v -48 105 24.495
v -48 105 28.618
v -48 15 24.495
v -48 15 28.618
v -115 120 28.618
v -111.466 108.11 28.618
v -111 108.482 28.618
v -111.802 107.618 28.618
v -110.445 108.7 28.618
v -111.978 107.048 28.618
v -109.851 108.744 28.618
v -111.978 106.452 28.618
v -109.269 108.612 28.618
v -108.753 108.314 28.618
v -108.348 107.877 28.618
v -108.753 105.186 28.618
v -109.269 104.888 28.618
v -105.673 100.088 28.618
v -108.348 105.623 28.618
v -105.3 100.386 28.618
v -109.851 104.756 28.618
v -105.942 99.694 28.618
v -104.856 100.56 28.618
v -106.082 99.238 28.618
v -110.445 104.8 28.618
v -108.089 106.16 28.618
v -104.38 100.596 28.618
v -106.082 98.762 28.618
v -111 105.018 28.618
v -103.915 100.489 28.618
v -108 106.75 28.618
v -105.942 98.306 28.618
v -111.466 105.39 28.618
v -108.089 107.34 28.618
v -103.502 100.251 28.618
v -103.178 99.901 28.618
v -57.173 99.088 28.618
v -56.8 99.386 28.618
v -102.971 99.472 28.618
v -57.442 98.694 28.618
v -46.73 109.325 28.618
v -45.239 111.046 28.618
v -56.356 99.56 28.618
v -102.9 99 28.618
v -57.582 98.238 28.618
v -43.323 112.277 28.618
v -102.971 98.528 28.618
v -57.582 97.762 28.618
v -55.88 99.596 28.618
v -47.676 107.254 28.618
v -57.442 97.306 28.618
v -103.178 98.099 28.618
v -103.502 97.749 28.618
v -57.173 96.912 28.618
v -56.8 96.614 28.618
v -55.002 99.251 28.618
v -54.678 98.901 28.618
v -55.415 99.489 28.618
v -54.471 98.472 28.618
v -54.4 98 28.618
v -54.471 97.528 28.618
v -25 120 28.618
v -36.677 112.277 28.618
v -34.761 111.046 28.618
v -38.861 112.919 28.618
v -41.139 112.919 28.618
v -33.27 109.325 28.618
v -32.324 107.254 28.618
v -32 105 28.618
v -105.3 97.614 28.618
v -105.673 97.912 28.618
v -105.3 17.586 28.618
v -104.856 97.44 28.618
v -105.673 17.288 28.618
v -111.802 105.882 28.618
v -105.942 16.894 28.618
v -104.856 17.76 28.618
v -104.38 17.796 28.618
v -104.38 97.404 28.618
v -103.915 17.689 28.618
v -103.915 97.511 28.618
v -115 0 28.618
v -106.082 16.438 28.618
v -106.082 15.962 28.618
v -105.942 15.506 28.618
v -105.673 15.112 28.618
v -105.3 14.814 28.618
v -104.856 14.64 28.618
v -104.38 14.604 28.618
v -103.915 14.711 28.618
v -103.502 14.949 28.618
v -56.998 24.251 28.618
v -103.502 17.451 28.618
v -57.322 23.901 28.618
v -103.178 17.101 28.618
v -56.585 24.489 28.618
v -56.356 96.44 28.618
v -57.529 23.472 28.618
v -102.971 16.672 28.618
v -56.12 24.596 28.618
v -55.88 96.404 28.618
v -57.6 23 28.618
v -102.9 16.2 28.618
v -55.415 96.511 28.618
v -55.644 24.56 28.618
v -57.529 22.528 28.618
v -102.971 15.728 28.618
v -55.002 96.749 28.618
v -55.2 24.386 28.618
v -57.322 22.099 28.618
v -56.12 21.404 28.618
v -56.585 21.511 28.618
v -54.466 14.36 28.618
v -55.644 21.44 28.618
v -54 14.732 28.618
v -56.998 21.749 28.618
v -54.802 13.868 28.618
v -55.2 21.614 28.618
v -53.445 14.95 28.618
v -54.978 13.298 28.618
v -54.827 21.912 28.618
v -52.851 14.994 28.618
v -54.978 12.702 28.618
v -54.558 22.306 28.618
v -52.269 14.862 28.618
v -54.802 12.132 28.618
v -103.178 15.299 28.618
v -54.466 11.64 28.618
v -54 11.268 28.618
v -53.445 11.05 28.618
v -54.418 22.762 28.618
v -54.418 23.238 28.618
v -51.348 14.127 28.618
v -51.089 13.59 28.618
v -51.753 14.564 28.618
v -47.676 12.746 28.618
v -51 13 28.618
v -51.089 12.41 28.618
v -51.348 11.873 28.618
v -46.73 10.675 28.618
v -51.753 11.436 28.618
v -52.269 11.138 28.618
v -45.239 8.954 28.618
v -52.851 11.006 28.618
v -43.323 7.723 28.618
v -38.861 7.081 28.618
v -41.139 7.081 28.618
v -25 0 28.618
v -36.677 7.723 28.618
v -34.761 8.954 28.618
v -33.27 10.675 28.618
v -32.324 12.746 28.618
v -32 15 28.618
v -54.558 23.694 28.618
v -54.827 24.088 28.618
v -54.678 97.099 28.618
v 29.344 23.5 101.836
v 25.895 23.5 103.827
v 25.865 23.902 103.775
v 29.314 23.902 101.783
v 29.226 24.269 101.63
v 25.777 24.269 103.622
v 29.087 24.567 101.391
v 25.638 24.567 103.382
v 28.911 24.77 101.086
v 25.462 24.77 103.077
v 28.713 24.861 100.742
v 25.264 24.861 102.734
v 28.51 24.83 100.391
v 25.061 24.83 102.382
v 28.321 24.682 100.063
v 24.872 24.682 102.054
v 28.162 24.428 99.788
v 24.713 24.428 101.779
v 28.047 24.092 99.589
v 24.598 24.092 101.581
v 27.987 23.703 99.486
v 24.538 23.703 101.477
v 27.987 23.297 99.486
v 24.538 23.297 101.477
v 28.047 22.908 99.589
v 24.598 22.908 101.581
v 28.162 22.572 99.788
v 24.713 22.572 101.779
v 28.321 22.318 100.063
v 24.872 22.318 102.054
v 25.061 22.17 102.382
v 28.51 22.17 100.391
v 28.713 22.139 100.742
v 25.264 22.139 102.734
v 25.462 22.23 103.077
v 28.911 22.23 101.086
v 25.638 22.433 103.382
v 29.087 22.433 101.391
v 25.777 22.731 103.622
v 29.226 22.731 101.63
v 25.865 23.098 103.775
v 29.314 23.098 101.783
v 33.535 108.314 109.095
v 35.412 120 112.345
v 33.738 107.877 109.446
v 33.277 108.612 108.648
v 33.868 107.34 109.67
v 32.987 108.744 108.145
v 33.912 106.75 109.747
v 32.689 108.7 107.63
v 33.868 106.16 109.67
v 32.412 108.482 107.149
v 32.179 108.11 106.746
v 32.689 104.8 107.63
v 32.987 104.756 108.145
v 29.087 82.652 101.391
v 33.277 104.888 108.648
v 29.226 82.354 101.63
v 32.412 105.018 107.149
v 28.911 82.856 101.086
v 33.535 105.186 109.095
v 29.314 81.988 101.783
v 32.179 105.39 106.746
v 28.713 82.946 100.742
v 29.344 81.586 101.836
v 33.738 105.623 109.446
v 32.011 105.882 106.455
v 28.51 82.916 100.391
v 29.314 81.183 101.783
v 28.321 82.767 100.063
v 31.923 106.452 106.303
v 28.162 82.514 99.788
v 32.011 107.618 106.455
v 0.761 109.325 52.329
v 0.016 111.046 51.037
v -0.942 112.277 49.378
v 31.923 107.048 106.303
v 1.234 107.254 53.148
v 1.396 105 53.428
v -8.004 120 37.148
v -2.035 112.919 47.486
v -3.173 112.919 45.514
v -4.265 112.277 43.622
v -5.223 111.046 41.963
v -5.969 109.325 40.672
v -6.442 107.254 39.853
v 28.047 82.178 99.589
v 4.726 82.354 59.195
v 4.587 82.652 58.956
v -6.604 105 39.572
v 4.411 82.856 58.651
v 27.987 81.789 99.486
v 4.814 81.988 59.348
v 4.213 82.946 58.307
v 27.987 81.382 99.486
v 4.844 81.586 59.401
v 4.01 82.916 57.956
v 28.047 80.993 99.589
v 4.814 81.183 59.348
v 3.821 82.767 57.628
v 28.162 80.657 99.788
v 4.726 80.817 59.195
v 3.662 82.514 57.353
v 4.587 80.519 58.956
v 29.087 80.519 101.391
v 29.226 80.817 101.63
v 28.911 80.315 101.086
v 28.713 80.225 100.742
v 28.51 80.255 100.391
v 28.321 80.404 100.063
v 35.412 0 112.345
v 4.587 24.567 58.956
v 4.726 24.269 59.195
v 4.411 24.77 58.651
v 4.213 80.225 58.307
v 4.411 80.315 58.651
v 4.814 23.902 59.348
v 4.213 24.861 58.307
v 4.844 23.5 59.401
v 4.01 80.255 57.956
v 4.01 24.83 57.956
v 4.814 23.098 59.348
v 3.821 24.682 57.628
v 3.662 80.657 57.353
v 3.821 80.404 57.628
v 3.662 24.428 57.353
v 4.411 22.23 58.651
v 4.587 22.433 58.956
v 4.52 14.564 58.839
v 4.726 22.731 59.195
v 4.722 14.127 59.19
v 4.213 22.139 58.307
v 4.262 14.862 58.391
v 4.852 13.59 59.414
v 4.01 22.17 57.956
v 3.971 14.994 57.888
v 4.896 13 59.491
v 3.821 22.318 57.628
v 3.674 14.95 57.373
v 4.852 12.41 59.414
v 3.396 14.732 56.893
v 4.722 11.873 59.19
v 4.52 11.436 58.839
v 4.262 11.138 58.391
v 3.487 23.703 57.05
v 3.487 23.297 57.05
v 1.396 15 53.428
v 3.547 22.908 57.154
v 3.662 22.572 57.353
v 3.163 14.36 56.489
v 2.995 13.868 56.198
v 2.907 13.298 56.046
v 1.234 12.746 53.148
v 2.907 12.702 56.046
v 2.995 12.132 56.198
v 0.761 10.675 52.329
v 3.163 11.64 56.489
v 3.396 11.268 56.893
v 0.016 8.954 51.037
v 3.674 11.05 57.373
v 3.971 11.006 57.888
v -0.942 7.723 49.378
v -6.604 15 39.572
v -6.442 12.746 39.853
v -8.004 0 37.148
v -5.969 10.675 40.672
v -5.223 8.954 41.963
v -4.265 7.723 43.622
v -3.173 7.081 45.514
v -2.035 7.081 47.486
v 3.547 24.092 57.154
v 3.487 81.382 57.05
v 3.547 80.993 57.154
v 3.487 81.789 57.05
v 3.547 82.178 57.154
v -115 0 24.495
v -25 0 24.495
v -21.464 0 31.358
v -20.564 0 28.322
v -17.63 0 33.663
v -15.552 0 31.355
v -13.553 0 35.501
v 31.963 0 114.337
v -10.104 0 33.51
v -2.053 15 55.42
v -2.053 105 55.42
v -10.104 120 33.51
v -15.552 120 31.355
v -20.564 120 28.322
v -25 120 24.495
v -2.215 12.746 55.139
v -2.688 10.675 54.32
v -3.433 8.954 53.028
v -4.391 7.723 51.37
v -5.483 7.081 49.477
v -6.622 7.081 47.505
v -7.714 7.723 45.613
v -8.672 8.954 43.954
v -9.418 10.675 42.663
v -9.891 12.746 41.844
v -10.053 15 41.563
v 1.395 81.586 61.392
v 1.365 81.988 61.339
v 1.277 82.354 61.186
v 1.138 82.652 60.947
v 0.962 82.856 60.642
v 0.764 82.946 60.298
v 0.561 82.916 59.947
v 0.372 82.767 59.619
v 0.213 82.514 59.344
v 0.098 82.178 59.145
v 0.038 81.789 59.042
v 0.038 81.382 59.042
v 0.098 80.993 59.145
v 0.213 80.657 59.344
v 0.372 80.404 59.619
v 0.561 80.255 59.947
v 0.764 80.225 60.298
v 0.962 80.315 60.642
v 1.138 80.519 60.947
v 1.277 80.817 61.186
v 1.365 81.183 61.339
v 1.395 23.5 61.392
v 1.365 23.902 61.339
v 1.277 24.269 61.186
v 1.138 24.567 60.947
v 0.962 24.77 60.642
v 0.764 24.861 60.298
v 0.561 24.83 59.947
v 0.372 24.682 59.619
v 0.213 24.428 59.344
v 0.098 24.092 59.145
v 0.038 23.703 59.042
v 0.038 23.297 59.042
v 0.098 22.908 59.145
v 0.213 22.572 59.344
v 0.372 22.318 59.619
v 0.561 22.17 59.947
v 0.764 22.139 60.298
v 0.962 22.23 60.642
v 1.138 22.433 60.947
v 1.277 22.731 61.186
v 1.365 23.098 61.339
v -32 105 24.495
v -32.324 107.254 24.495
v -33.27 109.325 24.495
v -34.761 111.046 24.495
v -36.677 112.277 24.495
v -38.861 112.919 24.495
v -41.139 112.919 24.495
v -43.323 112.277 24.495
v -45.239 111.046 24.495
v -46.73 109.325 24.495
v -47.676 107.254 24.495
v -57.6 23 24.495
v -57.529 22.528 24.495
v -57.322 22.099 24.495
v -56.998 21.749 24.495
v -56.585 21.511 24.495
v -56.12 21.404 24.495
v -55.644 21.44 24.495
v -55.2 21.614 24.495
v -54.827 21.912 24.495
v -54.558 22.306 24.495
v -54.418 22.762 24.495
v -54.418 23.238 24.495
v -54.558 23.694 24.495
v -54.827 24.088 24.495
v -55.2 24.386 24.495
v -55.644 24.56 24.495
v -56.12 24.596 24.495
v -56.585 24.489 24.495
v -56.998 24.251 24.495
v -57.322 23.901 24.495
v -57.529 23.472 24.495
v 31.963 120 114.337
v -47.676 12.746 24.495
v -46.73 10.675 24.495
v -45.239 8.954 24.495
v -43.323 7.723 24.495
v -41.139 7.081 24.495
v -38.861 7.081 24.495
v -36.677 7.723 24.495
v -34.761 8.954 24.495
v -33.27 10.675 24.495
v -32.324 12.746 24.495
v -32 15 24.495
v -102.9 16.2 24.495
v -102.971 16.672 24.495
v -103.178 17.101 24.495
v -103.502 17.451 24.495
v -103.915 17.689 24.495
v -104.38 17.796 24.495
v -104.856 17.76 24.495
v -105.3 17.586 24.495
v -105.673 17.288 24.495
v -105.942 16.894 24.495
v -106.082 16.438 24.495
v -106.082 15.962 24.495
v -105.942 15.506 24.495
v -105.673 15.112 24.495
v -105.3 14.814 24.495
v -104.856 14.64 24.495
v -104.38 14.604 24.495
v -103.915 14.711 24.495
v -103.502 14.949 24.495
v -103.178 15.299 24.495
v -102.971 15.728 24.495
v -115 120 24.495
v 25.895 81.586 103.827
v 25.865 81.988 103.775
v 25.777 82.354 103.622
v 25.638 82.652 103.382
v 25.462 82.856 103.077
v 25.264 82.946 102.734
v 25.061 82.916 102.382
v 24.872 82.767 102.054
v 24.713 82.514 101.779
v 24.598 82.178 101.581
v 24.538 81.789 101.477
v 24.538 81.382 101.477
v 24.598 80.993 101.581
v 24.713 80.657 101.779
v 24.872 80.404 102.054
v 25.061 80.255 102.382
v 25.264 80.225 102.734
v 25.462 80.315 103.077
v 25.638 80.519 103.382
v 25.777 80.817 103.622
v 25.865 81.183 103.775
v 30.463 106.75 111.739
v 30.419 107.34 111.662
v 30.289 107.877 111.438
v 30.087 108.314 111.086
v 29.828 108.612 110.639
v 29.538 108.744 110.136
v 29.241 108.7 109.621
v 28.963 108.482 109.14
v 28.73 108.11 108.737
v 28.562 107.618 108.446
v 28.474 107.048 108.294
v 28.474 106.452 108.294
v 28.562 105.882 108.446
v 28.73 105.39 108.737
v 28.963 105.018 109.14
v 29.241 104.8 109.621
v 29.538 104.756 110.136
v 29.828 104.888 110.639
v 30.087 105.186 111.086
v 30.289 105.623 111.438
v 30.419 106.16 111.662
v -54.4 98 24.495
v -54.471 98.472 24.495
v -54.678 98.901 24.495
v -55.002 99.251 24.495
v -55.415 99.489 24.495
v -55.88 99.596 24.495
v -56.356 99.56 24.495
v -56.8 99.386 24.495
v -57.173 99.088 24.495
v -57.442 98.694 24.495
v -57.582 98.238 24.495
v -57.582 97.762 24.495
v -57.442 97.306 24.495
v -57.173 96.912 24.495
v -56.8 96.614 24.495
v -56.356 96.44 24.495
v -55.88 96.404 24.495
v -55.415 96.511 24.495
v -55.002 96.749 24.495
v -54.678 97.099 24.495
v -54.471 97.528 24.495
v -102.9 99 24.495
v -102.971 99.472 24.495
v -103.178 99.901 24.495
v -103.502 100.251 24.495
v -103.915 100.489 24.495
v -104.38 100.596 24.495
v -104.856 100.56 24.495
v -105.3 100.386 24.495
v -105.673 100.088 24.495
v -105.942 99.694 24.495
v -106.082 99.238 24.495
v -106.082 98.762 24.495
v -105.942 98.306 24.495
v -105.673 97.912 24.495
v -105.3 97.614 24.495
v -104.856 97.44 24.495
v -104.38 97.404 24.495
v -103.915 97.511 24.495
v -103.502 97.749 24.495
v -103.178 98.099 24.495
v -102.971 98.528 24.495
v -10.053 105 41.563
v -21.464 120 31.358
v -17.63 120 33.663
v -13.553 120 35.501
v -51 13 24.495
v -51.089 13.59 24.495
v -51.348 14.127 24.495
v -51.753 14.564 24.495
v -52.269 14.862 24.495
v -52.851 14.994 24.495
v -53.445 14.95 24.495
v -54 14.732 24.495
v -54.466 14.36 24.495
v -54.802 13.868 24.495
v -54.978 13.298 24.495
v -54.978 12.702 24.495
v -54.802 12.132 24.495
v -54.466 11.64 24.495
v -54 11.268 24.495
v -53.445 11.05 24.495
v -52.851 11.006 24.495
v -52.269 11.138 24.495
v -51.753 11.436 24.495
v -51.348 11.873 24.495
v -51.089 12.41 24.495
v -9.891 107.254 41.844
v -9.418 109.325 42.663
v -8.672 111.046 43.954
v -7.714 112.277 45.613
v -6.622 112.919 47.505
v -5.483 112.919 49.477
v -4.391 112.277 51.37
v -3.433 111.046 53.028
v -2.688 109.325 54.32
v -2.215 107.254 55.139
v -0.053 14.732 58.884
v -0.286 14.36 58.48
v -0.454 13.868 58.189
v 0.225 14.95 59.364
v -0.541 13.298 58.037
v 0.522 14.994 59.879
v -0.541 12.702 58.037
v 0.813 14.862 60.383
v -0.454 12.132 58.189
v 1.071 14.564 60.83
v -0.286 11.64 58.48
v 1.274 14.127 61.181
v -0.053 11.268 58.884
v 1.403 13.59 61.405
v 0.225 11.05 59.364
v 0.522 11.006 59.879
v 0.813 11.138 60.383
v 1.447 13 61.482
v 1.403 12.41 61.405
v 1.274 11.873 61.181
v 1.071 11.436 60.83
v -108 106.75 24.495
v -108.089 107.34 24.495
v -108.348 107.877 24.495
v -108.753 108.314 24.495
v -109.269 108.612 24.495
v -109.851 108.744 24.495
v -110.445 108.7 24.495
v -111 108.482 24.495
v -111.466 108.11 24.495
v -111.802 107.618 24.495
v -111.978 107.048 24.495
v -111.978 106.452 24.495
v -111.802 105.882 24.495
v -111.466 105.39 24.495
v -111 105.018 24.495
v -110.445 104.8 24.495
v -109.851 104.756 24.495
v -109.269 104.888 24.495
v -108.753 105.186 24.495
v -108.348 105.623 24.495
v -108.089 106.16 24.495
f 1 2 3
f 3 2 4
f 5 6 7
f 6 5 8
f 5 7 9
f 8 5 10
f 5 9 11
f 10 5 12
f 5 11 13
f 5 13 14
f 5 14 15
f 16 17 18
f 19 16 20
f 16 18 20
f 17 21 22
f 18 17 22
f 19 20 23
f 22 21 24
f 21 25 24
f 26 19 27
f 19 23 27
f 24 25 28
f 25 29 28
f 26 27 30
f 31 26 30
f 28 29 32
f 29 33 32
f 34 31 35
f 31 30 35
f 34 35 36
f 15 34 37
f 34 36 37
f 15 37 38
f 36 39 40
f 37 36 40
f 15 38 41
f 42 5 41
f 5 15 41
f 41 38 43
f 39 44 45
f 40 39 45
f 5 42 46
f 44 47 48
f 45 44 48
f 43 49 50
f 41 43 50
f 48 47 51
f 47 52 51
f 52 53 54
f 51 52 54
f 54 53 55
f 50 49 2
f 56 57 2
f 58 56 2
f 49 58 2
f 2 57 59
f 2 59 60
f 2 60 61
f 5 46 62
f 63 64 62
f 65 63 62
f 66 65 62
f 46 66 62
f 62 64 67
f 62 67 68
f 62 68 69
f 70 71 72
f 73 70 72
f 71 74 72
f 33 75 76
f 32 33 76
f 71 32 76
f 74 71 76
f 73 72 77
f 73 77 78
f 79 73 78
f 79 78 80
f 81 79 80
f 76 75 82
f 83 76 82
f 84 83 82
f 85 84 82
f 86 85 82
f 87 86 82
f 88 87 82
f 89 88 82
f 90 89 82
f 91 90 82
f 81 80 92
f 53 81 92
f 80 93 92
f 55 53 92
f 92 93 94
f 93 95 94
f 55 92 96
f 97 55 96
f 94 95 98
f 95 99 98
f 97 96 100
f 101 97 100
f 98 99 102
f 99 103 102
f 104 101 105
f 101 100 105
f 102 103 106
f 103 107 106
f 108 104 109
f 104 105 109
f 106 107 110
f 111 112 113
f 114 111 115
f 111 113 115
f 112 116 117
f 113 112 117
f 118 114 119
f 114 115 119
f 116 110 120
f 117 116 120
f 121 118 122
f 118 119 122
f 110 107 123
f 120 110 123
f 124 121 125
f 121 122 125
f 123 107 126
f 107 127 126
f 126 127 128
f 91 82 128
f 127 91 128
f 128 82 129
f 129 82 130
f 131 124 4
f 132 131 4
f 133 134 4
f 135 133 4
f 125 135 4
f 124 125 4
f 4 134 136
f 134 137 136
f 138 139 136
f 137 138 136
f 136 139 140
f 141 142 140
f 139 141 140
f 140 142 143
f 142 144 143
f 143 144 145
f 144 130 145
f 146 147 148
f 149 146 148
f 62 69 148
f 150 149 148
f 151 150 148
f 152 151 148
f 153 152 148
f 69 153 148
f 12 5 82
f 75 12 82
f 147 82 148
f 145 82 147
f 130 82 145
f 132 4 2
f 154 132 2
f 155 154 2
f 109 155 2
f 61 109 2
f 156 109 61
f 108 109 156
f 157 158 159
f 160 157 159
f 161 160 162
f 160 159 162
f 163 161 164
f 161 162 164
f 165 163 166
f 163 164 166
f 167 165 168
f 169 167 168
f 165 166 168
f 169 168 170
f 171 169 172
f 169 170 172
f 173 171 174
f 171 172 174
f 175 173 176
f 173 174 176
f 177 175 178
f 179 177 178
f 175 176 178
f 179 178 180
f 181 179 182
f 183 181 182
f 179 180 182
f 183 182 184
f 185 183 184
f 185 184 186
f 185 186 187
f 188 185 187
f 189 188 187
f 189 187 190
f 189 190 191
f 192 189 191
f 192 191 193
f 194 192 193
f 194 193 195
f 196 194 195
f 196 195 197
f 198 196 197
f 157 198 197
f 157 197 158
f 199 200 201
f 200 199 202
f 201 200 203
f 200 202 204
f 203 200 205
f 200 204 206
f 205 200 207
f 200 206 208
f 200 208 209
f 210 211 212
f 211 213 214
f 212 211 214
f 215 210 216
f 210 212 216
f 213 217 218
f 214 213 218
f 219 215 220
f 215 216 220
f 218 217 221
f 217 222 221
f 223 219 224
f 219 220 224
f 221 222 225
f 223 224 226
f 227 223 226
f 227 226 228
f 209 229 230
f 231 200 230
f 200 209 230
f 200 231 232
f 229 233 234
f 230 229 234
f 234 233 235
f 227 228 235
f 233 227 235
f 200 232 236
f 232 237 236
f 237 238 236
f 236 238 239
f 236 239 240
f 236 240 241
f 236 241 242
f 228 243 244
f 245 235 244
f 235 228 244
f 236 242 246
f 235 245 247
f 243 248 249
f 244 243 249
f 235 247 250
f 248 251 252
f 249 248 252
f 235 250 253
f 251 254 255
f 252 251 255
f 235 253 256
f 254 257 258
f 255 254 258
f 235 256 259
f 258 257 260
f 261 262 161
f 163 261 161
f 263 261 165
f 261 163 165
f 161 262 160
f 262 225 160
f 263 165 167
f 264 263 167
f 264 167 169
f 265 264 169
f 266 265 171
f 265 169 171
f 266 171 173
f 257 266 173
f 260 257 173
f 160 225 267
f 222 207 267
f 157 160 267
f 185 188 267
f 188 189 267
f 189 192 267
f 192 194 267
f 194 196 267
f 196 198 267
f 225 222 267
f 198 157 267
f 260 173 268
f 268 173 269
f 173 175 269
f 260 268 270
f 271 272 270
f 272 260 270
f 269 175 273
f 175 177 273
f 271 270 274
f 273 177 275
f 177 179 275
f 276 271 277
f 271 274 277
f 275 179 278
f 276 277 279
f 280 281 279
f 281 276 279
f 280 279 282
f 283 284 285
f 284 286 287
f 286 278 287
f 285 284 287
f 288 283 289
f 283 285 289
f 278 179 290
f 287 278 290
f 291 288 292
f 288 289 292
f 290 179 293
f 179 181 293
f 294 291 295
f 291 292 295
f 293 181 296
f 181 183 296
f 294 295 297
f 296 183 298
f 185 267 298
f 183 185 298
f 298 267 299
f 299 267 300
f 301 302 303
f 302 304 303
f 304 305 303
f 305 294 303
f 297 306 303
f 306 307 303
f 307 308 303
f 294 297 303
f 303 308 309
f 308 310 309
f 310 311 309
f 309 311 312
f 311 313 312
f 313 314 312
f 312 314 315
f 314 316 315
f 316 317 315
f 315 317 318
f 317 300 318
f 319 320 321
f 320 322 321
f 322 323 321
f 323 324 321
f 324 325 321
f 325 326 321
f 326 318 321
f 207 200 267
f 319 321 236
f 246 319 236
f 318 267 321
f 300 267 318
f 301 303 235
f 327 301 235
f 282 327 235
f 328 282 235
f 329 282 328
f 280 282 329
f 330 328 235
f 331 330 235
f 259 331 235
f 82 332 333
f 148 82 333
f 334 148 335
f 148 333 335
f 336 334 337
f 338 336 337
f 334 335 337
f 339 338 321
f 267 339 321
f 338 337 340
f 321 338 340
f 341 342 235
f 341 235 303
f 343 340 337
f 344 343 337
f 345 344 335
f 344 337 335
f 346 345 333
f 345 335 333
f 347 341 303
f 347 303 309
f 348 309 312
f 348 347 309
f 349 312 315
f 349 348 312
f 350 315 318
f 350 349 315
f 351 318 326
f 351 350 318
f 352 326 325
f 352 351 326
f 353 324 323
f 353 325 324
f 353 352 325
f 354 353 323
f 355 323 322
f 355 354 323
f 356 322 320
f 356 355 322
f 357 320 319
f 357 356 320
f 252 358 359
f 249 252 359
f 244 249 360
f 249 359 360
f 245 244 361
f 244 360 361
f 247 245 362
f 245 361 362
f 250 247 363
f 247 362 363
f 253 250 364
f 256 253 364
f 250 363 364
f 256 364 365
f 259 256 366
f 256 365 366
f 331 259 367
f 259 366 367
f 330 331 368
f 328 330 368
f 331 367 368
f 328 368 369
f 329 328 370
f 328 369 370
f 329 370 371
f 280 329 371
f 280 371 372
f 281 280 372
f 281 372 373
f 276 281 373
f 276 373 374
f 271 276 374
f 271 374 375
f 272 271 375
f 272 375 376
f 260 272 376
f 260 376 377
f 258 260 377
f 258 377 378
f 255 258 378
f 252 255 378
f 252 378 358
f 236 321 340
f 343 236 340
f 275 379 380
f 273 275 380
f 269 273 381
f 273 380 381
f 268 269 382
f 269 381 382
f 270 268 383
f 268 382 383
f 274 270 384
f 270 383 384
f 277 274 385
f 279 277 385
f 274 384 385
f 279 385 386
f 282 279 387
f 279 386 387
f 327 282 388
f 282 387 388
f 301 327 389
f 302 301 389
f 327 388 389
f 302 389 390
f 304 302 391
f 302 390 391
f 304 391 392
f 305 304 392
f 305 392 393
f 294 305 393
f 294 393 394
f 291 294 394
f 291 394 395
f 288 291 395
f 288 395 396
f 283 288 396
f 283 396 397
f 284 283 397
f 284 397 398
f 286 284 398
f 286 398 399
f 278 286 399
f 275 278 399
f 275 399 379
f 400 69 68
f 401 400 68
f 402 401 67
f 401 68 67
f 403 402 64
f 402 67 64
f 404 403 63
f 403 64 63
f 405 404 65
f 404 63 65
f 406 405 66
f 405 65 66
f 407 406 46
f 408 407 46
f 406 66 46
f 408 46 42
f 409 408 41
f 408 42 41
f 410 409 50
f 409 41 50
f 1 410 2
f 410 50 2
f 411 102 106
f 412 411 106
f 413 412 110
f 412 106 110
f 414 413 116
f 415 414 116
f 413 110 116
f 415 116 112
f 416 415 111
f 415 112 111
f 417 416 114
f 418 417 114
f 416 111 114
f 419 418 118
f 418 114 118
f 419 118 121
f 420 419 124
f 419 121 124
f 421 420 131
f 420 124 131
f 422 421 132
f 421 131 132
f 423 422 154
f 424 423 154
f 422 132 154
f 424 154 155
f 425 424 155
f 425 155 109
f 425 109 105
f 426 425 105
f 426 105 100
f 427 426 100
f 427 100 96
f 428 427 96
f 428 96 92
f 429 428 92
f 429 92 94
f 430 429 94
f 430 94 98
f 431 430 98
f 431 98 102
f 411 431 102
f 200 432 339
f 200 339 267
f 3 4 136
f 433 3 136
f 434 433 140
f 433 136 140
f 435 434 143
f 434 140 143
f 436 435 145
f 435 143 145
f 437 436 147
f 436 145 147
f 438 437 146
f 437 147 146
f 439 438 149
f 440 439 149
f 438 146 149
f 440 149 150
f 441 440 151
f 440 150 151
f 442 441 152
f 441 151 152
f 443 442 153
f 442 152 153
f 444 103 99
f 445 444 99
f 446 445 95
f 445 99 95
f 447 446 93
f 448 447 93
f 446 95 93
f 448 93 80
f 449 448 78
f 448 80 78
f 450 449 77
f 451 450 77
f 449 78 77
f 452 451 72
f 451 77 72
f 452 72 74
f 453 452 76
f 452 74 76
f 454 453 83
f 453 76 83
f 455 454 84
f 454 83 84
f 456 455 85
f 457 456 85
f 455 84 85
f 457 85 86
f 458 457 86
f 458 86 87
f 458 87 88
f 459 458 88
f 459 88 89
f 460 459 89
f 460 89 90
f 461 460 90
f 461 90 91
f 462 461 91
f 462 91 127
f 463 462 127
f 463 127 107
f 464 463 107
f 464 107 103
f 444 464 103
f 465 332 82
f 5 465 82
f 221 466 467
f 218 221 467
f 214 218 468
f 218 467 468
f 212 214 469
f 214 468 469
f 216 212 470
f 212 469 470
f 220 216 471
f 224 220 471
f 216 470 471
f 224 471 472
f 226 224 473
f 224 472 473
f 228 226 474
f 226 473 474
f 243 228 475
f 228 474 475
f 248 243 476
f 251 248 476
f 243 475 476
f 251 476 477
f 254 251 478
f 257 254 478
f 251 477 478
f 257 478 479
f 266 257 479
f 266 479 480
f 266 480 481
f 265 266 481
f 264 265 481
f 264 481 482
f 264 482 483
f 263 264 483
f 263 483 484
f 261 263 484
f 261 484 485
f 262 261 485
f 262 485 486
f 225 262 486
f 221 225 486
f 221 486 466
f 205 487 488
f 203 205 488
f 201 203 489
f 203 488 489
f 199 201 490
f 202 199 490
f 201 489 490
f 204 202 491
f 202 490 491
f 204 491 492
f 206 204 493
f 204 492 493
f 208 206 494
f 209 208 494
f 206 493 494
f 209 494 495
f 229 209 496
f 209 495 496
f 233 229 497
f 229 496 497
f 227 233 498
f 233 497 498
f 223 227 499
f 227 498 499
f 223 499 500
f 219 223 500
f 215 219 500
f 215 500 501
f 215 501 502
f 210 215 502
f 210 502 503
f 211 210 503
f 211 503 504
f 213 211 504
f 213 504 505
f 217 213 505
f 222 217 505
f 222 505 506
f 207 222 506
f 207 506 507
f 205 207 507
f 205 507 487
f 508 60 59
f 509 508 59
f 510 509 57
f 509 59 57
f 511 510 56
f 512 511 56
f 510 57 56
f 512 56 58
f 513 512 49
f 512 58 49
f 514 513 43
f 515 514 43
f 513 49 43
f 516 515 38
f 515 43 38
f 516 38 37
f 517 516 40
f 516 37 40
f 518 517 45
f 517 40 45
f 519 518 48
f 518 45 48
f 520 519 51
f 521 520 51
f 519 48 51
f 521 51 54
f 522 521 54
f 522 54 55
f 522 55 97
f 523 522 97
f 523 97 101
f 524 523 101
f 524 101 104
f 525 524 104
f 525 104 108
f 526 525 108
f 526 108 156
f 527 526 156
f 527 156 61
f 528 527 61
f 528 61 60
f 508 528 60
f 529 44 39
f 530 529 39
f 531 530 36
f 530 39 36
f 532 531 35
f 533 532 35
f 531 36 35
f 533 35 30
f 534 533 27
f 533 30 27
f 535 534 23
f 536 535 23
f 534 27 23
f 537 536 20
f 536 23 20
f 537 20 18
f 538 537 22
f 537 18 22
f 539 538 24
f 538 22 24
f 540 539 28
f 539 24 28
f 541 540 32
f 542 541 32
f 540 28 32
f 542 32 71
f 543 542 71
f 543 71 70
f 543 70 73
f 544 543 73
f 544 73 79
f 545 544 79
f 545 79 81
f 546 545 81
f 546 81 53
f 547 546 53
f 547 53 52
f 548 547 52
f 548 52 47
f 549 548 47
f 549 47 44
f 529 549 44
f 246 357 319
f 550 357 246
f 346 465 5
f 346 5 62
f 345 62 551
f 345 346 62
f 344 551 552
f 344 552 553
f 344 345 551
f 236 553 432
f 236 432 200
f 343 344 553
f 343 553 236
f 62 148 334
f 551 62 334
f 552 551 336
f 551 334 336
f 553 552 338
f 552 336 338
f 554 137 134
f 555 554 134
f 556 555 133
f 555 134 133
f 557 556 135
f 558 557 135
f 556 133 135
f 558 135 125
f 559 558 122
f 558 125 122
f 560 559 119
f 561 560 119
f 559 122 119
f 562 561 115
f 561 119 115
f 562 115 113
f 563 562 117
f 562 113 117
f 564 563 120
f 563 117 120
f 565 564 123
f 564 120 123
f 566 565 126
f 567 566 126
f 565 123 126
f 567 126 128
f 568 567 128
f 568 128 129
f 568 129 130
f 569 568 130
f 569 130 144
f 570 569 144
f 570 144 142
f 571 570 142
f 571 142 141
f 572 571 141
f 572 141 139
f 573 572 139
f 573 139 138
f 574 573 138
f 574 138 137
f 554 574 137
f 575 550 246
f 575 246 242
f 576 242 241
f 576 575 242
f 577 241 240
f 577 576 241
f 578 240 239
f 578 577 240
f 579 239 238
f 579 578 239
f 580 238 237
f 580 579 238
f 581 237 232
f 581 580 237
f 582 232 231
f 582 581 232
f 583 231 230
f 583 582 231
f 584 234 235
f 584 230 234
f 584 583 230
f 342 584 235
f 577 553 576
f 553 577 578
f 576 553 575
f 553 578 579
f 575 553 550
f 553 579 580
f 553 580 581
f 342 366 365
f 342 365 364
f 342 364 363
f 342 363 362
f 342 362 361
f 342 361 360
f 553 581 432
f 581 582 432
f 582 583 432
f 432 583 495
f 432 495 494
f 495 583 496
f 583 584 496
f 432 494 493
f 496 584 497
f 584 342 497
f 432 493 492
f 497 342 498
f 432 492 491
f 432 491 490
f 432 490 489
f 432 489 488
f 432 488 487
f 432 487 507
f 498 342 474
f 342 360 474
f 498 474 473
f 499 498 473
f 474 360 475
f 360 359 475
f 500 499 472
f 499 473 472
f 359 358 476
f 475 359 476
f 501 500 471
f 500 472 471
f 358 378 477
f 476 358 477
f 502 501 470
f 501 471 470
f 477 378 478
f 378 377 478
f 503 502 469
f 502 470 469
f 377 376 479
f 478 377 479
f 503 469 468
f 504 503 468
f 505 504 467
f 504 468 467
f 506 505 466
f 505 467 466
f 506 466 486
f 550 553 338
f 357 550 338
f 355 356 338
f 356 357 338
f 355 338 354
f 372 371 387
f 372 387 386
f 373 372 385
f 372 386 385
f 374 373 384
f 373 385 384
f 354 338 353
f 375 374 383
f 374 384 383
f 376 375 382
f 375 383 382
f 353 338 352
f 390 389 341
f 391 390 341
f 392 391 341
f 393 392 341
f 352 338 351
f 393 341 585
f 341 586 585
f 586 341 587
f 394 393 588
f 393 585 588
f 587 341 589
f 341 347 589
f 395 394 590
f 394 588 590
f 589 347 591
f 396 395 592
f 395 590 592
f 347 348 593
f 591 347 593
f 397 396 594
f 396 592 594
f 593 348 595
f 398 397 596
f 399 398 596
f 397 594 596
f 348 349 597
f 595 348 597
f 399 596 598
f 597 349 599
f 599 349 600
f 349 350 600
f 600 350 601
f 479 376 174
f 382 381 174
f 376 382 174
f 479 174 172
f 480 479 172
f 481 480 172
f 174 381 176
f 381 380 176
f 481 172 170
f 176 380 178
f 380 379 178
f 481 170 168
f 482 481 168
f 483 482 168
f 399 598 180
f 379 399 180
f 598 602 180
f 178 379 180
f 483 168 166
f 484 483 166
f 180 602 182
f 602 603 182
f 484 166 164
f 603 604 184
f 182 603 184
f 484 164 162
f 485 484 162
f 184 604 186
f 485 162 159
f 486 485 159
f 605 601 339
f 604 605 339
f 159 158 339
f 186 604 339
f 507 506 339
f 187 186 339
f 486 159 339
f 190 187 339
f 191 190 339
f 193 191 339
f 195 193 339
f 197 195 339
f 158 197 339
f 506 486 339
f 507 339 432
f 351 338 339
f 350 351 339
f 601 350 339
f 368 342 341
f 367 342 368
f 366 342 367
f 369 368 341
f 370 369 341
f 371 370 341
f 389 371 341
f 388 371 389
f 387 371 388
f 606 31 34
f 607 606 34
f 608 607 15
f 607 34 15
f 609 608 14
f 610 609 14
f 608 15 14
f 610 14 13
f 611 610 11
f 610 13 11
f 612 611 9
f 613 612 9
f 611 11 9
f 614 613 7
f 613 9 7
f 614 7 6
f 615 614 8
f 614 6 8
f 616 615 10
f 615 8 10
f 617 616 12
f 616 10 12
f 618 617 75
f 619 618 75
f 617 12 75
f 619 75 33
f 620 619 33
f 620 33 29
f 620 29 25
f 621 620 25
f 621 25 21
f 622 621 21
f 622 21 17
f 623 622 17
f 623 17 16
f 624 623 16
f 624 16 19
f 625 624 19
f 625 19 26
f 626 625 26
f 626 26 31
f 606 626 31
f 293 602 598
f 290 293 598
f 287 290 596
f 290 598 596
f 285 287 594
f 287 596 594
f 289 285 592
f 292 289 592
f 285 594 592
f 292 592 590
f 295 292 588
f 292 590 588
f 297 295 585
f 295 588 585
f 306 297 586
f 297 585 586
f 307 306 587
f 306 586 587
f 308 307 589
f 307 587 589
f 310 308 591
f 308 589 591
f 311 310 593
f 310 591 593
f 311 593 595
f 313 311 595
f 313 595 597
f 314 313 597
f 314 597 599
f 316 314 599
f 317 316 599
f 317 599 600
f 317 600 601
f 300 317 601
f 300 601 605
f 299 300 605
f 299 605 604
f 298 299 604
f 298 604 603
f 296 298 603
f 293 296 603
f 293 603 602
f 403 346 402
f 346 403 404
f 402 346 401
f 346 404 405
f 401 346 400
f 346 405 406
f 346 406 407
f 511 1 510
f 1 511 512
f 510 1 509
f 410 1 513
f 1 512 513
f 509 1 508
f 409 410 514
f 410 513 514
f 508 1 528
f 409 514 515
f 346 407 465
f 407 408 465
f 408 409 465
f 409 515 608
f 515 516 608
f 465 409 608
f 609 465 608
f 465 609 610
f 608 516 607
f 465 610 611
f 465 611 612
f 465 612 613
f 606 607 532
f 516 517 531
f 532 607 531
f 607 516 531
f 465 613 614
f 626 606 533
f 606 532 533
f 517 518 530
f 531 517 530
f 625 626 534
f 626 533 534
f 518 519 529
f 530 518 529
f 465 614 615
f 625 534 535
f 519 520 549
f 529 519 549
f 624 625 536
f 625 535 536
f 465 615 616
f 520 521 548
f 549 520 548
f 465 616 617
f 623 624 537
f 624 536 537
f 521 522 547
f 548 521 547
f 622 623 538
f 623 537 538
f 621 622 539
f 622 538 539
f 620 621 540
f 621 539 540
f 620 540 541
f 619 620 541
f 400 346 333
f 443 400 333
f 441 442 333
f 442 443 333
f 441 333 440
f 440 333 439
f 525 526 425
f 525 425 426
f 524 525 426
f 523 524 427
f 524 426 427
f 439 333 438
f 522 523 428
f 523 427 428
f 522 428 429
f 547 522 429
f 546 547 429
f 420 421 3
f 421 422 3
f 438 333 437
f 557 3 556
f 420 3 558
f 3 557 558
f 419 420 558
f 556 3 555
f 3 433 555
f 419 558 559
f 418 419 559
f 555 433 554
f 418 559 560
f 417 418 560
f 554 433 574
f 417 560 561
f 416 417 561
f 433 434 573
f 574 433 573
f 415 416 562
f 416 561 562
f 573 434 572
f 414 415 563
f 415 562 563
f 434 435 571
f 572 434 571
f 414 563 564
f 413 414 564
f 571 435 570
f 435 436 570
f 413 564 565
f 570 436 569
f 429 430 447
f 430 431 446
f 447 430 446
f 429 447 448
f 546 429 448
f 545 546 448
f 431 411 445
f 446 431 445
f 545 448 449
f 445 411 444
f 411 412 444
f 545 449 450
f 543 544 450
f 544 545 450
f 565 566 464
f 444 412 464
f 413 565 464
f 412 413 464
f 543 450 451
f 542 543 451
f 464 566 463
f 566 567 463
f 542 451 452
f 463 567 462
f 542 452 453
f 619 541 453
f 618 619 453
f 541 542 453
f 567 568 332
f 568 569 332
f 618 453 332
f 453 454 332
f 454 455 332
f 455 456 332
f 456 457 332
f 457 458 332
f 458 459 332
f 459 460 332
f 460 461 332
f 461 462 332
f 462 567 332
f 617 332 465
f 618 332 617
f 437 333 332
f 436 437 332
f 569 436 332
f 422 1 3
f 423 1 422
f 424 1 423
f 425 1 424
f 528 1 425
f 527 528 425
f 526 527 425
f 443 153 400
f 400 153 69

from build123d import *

# Parameters (mm, degrees)
BOSS_EXTRU_1_DEPTH      = 120
ENL_V_MAT_EXTRU_1_DEPTH = 188.009777727
ENL_V_MAT_EXTRU_2_DEPTH = 180.784310366
ESQUISSE6_R             = 2
ENL_V_MAT_EXTRU_3_DEPTH = 188.009777727
ESQUISSE7_R             = 2
ENL_V_MAT_EXTRU_4_DEPTH = 180.784310366
ESQUISSE10_R            = 1.364499713
ENL_V_MAT_EXTRU_5_DEPTH = 180.784310366
ENL_V_MAT_EXTRU_6_DEPTH = 188.009777727
ESQUISSE11_R            = 2
ENL_V_MAT_EXTRU_7_DEPTH = 188.009777727
ESQUISSE12_R            = 2
ENL_V_MAT_EXTRU_8_DEPTH = 180.784310366


with BuildPart() as part:
    # Esquisse3 → Boss.-Extru.1 (new body)
    with BuildSketch(Plane(origin=(0, 0, 0), x_dir=(1, 0, 0), z_dir=(0, 1, 0))):
        with BuildLine():
            ThreePointArc((-25, -28.618176043), (-27.104360033, -26.633694209), (-29.051678093, -24.494897428))
            Line((-29.051678093, -24.494897428), (-115, -24.494897428))
            Line((-115, -24.494897428), (-115, -28.618176043))
            Line((-115, -28.618176043), (-25, -28.618176043))
        make_face()
        with BuildLine():
            ThreePointArc((-10.103808925, -33.509894736), (-18.121448463, -29.943498553), (-25, -24.494897428))
            Line((-25, -24.494897428), (-29.051678093, -24.494897428))
            ThreePointArc((-29.051678093, -24.494897428), (-27.104360033, -26.633694209), (-25, -28.618176043))
            ThreePointArc((-25, -28.618176043), (-19.581111, -32.566548666), (-13.552631037, -35.50107311))
            ThreePointArc((-13.552631037, -35.50107311), (-10.809506446, -36.430132725), (-8.003591765, -37.147577564))
            Line((-8.003591765, -37.147577564), (-10.103808925, -33.509894736))
        make_face()
        with BuildLine():
            Line((35.411933246, -112.345472721), (-8.003591765, -37.147577564))
            ThreePointArc((-8.003591765, -37.147577564), (-10.809506446, -36.430132725), (-13.552631037, -35.50107311))
            Line((-13.552631037, -35.50107311), (31.963111135, -114.336651096))
            Line((31.963111135, -114.336651096), (35.411933246, -112.345472721))
        make_face()
    extrude(amount=BOSS_EXTRU_1_DEPTH)

    # Esquisse4 → Enlèv. mat.-Extru.1 (cut, through all)
    with BuildSketch(Plane.XY.offset(28.618176043)):
        with BuildLine():
            Line((-48, 105), (-48, 15))
            ThreePointArc((-48, 15), (-40, 7), (-32, 15))
            Line((-32, 15), (-32, 105))
            ThreePointArc((-32, 105), (-40, 113), (-48, 105))
        make_face()
    extrude(amount=-ENL_V_MAT_EXTRU_1_DEPTH, mode=Mode.SUBTRACT)

    # Esquisse5 → Enlèv. mat.-Extru.2 (cut, through all)
    with BuildSketch(Plane(origin=(-25.536888865, 0, 14.743729661), x_dir=(0.4999999999999999, 0, 0.8660254037844386), z_dir=(-0.8660254037844387, 0, 0.49999999999999994))):
        with BuildLine():
            Line((46.968515657, 105), (46.968515657, 15))
            ThreePointArc((46.968515657, 15), (38.968515657, 7), (30.968515657, 15))
            Line((30.968515657, 15), (30.968515657, 105))
            ThreePointArc((30.968515657, 105), (38.968515657, 113), (46.968515657, 105))
        make_face()
    extrude(amount=-ENL_V_MAT_EXTRU_2_DEPTH, mode=Mode.SUBTRACT)

    # Esquisse6 → Enlèv. mat.-Extru.3 (cut, through all)
    with BuildSketch(Plane.XY.offset(28.618176043)):
        with Locations((-110, 106.75)):
            Circle(ESQUISSE6_R)
    extrude(amount=-ENL_V_MAT_EXTRU_3_DEPTH, mode=Mode.SUBTRACT)

    # Esquisse7 → Enlèv. mat.-Extru.4 (cut, through all)
    with BuildSketch(Plane(origin=(-25.536888865, 0, 14.743729661), x_dir=(0.4999999999999999, 0, 0.8660254037844386), z_dir=(-0.8660254037844387, 0, 0.49999999999999994))):
        with Locations((110, 106.75)):
            Circle(ESQUISSE7_R)
    extrude(amount=-ENL_V_MAT_EXTRU_4_DEPTH, mode=Mode.SUBTRACT)

    # Esquisse10 → Enlèv. mat.-Extru.5 (cut, through all)
    with BuildSketch(Plane(origin=(-25.536888865, 0, 14.743729661), x_dir=(0.4999999999999999, 0, 0.8660254037844386), z_dir=(-0.8660254037844387, 0, 0.49999999999999994))):
        with Locations((101.5, 23.5)):
            Circle(ESQUISSE10_R)
        with Locations((52.5, 23.5)):
            Circle(ESQUISSE10_R)
        with Locations((52.5, 81.585512482)):
            Circle(ESQUISSE10_R)
        with Locations((101.5, 81.585512482)):
            Circle(ESQUISSE10_R)
    extrude(amount=-ENL_V_MAT_EXTRU_5_DEPTH, mode=Mode.SUBTRACT)

    # Esquisse9 → Enlèv. mat.-Extru.6 (cut, through all)
    with BuildSketch(Plane.XY.offset(28.618176043)):
        with BuildLine():
            ThreePointArc((-54.4, 23), (-56, 24.6), (-57.6, 23))
            ThreePointArc((-57.6, 23), (-56, 21.4), (-54.4, 23))
        make_face()
        with BuildLine():
            ThreePointArc((-106.1, 16.2), (-104.5, 14.6), (-102.9, 16.2))
            ThreePointArc((-102.9, 16.2), (-104.5, 17.8), (-106.1, 16.2))
        make_face()
        with BuildLine():
            ThreePointArc((-57.6, 98), (-56, 96.4), (-54.4, 98))
            ThreePointArc((-54.4, 98), (-56, 99.6), (-57.6, 98))
        make_face()
        with BuildLine():
            ThreePointArc((-106.1, 99), (-104.5, 97.4), (-102.9, 99))
            ThreePointArc((-102.9, 99), (-104.5, 100.6), (-106.1, 99))
        make_face()
    extrude(amount=-ENL_V_MAT_EXTRU_6_DEPTH, mode=Mode.SUBTRACT)

    # Esquisse11 → Enlèv. mat.-Extru.7 (cut, through all)
    with BuildSketch(Plane.XY.offset(28.618176043)):
        with Locations((-53, 13)):
            Circle(ESQUISSE11_R)
    extrude(amount=-ENL_V_MAT_EXTRU_7_DEPTH, mode=Mode.SUBTRACT)

    # Esquisse12 → Enlèv. mat.-Extru.8 (cut, through all)
    with BuildSketch(Plane(origin=(-25.536888865, 0, 14.743729661), x_dir=(0.4999999999999999, 0, 0.8660254037844386), z_dir=(-0.8660254037844387, 0, 0.49999999999999994))):
        with Locations((51.968515657, 13)):
            Circle(ESQUISSE12_R)
    extrude(amount=-ENL_V_MAT_EXTRU_8_DEPTH, mode=Mode.SUBTRACT)


solid = part.part
